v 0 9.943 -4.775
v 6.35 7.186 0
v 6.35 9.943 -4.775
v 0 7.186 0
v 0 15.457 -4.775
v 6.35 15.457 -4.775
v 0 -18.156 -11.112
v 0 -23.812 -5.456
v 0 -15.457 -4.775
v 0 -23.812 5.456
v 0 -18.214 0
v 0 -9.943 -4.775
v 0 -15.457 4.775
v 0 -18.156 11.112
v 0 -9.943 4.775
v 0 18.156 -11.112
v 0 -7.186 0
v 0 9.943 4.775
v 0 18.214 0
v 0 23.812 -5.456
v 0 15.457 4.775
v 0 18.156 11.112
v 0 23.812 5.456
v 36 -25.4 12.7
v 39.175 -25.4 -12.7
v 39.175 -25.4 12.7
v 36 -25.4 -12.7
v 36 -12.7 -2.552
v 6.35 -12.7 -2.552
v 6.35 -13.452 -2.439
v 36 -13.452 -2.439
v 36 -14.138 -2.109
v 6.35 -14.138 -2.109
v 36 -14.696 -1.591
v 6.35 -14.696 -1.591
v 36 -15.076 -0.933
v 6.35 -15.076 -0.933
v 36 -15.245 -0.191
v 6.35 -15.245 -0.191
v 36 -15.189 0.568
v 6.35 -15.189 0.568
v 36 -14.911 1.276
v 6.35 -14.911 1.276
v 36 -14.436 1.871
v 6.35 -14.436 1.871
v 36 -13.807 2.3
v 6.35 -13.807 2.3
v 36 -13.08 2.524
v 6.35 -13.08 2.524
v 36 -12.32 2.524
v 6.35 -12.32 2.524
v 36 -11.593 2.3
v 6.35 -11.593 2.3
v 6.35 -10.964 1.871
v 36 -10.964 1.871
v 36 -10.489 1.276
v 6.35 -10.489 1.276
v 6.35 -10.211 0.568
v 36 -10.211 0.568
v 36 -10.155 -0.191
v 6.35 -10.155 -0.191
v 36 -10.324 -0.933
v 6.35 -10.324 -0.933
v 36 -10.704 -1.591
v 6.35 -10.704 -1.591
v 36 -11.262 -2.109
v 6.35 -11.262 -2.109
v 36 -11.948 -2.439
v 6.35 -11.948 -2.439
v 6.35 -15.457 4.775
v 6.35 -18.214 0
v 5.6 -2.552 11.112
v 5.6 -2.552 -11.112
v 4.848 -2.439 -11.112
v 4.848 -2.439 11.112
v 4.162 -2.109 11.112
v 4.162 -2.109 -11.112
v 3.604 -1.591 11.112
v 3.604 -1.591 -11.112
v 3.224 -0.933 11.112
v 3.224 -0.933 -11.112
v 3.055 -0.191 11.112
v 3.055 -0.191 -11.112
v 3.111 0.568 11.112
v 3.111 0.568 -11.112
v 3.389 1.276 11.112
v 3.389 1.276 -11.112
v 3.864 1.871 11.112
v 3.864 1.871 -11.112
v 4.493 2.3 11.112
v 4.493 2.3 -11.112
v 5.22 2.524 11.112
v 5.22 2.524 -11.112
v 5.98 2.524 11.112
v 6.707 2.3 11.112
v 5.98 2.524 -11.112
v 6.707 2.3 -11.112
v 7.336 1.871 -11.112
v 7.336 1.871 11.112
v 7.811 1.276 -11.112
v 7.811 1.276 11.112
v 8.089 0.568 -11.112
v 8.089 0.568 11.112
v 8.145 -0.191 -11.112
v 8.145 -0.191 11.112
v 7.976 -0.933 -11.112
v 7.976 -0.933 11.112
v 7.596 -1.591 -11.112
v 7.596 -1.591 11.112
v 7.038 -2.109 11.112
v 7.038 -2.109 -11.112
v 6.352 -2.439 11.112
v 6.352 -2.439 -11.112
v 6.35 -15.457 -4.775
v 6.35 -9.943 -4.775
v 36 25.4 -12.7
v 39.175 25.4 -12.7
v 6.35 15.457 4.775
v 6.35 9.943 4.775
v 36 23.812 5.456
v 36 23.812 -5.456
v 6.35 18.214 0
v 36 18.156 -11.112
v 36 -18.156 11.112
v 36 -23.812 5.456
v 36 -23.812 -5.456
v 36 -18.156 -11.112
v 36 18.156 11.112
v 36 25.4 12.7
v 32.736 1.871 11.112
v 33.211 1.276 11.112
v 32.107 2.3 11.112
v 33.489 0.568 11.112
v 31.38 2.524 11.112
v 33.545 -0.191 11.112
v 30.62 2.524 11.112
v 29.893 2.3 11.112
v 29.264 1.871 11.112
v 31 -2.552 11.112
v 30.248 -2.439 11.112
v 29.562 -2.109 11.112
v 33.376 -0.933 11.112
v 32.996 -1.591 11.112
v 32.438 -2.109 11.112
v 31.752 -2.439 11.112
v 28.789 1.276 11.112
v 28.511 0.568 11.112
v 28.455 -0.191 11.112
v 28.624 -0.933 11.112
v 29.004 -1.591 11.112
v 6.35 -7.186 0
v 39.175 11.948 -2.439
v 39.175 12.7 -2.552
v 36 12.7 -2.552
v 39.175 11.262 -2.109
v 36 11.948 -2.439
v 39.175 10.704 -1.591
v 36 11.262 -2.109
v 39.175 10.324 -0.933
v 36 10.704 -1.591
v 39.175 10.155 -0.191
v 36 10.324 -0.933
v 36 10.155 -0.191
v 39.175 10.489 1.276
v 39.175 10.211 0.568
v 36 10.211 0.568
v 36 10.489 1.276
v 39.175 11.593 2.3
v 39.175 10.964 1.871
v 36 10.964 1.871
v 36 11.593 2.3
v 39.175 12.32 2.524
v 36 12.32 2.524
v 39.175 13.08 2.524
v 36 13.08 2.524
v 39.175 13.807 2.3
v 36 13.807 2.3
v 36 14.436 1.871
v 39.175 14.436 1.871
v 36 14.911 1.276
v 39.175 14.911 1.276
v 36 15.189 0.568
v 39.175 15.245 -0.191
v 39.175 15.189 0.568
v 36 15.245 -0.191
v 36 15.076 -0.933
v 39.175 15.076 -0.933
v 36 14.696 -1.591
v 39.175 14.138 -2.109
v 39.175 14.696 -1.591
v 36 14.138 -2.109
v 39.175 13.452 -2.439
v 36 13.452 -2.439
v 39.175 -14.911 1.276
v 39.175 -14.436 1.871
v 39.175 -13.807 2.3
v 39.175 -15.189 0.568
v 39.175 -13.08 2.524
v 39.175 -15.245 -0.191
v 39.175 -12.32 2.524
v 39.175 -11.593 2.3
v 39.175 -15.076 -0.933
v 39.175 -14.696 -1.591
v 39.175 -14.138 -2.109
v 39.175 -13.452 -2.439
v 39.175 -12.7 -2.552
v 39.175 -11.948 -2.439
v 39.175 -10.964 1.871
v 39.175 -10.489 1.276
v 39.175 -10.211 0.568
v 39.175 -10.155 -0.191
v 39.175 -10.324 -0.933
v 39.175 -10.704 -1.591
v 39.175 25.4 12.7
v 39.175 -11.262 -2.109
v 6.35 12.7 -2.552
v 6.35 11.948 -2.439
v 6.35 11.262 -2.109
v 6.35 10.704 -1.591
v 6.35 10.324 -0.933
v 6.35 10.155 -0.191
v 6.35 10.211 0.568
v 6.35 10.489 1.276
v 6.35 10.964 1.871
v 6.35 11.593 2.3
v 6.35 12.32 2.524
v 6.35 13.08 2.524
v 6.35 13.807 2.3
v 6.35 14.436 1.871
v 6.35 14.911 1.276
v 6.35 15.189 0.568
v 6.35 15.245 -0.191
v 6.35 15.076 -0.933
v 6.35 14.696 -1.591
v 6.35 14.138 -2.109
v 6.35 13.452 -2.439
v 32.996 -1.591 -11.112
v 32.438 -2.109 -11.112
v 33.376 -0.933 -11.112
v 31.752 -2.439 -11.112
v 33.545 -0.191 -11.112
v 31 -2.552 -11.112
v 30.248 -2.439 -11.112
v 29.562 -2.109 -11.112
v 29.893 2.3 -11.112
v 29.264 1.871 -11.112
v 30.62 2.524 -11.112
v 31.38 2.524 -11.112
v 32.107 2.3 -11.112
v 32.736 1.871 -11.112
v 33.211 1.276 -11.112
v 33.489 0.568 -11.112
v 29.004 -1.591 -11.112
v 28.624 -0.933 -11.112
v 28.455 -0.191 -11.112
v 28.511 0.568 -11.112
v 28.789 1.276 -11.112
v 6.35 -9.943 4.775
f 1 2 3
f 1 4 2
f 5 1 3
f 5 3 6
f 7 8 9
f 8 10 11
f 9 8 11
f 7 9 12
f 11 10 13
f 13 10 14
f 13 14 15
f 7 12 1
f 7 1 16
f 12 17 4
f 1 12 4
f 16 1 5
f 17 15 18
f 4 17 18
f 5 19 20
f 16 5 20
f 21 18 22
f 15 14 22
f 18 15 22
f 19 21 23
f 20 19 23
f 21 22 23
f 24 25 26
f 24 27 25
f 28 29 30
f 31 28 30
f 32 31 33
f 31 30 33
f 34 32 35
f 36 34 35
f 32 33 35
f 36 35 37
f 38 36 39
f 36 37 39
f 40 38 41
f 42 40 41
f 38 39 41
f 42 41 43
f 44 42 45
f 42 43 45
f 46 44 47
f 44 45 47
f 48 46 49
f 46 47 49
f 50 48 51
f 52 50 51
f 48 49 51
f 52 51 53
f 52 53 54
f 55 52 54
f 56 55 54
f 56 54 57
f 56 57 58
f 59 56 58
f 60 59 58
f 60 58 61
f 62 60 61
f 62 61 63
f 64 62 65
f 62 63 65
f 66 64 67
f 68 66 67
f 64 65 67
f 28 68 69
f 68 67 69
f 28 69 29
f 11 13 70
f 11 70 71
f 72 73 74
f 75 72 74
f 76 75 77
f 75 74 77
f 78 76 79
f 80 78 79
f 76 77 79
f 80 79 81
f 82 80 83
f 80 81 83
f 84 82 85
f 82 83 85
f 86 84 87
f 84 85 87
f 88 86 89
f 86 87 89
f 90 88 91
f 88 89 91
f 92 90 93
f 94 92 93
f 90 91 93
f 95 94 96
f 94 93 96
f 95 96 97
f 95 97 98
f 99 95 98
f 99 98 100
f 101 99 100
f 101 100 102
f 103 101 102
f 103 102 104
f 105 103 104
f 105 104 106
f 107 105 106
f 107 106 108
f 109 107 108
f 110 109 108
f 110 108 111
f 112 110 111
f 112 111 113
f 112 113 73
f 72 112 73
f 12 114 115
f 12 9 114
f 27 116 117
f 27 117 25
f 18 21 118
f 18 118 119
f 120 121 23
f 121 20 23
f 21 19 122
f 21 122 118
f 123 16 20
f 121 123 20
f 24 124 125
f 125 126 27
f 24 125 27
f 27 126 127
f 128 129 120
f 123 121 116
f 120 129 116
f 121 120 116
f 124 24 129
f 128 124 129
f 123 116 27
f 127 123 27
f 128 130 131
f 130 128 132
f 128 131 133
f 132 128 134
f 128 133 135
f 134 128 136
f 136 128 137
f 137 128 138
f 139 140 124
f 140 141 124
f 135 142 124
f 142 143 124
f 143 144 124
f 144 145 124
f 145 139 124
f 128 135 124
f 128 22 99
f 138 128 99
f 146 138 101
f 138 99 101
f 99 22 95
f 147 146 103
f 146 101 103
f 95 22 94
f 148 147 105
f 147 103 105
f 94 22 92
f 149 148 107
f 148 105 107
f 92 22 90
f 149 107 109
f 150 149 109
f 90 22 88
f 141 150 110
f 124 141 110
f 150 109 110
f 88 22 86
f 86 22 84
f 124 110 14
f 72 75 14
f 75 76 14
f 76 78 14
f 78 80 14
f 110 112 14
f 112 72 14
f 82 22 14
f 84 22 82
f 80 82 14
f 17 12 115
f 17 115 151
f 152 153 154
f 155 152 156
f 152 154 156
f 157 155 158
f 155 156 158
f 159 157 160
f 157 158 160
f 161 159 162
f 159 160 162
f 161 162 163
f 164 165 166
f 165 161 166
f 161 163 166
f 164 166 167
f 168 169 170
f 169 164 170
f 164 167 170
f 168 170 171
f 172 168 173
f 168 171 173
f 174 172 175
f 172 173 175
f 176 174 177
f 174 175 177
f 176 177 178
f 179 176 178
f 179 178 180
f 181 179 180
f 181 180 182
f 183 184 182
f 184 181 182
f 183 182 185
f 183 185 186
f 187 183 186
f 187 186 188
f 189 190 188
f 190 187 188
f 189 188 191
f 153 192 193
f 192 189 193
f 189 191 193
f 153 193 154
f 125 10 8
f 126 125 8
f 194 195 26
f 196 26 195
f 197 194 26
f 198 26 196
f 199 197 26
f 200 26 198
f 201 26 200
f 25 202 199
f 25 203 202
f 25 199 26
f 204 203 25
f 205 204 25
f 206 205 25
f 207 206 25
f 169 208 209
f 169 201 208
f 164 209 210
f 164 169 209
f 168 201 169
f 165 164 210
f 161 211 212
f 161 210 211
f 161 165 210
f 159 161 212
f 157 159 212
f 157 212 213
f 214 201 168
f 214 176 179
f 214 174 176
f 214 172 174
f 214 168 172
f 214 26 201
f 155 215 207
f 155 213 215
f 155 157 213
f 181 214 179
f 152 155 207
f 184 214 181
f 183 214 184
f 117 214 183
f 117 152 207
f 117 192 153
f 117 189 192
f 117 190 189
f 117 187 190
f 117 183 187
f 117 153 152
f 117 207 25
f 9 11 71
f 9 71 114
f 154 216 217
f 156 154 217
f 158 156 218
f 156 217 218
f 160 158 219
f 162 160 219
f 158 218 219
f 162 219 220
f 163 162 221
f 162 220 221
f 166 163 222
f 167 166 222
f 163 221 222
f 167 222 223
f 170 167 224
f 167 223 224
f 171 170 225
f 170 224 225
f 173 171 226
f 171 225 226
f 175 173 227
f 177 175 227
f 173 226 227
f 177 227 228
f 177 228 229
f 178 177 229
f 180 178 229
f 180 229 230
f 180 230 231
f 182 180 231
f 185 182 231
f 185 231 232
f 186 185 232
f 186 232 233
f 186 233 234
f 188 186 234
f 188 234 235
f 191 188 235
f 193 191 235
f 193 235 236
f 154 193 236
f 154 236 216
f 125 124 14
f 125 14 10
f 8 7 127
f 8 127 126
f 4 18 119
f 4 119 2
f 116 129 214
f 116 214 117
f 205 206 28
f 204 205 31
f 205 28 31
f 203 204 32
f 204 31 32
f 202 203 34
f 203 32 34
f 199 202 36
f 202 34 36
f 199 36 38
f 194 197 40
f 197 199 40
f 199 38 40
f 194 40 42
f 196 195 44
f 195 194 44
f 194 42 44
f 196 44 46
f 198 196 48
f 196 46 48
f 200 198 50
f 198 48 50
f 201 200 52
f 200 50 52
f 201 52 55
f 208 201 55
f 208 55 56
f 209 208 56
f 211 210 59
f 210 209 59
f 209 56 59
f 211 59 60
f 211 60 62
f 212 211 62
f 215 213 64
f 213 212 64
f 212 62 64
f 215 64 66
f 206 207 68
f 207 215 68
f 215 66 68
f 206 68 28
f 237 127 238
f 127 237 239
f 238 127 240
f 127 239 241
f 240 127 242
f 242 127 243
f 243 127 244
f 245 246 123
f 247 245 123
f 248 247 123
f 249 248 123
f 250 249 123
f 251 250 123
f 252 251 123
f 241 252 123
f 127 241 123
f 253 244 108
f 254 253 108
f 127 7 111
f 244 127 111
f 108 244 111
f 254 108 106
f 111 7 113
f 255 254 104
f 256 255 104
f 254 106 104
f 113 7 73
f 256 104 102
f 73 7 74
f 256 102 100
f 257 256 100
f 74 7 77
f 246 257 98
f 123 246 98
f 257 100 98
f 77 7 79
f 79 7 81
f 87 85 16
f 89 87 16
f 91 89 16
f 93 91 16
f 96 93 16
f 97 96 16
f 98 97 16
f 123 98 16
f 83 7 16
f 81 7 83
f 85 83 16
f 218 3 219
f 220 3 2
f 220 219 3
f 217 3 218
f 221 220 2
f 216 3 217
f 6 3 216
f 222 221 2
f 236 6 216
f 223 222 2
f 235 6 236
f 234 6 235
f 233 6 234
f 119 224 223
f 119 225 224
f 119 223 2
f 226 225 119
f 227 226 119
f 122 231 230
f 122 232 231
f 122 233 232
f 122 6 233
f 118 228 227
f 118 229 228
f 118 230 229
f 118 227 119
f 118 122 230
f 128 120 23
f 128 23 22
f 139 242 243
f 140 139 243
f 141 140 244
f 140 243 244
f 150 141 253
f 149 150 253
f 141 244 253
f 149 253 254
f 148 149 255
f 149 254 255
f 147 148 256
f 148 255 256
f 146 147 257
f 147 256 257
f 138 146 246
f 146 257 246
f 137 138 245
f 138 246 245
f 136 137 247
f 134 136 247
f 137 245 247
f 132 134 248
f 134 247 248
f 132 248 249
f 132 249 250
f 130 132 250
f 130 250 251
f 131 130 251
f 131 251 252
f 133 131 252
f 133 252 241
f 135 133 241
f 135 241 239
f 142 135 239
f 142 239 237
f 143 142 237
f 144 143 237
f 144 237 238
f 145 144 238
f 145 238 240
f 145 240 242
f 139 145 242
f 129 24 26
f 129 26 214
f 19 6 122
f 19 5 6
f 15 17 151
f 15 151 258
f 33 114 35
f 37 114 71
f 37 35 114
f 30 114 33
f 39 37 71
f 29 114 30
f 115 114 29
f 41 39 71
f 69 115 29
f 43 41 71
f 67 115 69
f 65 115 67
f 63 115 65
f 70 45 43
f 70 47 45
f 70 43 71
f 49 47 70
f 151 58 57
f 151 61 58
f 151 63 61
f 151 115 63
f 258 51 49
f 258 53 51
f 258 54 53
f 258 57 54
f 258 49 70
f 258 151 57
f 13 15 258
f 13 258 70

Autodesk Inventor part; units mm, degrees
ref_plane "YZ Plane" through (0, 0, 0) normal (1, 0, 0) x (0, 1, 0)
ref_plane "XZ Plane" through (0, 0, 0) normal (0, 1, 0) x (-1, 0, 0)
ref_plane "XY Plane" through (0, 0, 0) normal (0, 0, 1) x (1, 0, 0)
sketch "Sketch1" plane through (0, 0, 0) normal (1, 0, 0) x (0, 1, 0)
  line L0 (-23.8125, -11.1125) -> (23.8125, -11.1125)
  line L1 (23.8125, -11.1125) -> (23.8125, 11.1125)
  line L2 (23.8125, 11.1125) -> (-23.8125, 11.1125)
  line L3 (-23.8125, 11.1125) -> (-23.8125, -11.1125)
  line L4 (-23.8125, -11.1125) -> (23.8125, 11.1125) construction
  line L5 (23.8125, -11.1125) -> (-23.8125, 11.1125) construction
  line L6 (23.8125, 5.4556) -> (18.1556, 11.1125)
  line L7 (-18.1556, 11.1125) -> (-23.8125, 5.4556)
  line L8 (-18.1556, -11.1125) -> (-23.8125, -5.4556)
  line L9 (18.1556, -11.1125) -> (23.8125, -5.4556)
  point P0 (0, 0)
  dimension "d0" = 135
  dimension "d1" = 135
  dimension "d2" = 4
  dimension "d3" = 47.625
  dimension "d4" = 22.225
extrude "Extrusion1" add sketch "Sketch1" along normal blind 36 contours L8 L3 L7 L2 L6 L1 L9 L0
sketch "Sketch2" plane through (36, 0, 0) normal (1, 0, 0) x (0, 0, -1)
  line L0 (0, 12.7) -> (0, -12.7)
  point P0 (0, 0)
  point P1 (0, 0)
  dimension "d7" = 25.4
hole "Hole1" at (36, 12.7, 0) at (36, -12.7, 0) direction (-1, 0, 0) diameter 5.105 end through all clearance for "Flat Head Machine Screw (82)" size "#10" standard "Ansi Unified Screw Threads"
sketch "Sketch3" plane through (0, 0, 0) normal (-1, 0, 0) x (0, 0, 1)
  circle A0 centre (0, 12.7) radius 2.5525 projected
  line L0 (-4.7752, 15.457) -> (0, 18.2139)
  line L1 (0, 18.2139) -> (4.7752, 15.457)
  line L2 (4.7752, 15.457) -> (4.7752, 9.943)
  line L3 (4.7752, 9.943) -> (0, 7.1861)
  line L4 (0, 7.1861) -> (-4.7752, 9.943)
  line L5 (-4.7752, 9.943) -> (-4.7752, 15.457)
  circle A1 centre (0, -12.7) radius 2.5525 projected
  line L6 (-4.7752, -9.943) -> (0, -7.1861)
  line L7 (0, -7.1861) -> (4.7752, -9.943)
  line L8 (4.7752, -9.943) -> (4.7752, -15.457)
  line L9 (4.7752, -15.457) -> (0, -18.2139)
  line L10 (0, -18.2139) -> (-4.7752, -15.457)
  line L11 (-4.7752, -15.457) -> (-4.7752, -9.943)
  point P0 (0, 0)
  dimension "d15" = 9.5504
  dimension "d16" = 9.5504
extrude "Extrusion2" cut sketch "Sketch3" against normal blind 6.35 contours A0 | L0 L1 L2 L3 L4 L5 | A1 | L6 L7 L8 L9 L10 L11
sketch "Sketch4" plane through (36, 0, 0) normal (1, 0, 0) x (0, 0, -1)
  line L0 (12.7, -25.4) -> (-12.7, -25.4)
  line L1 (-12.7, -25.4) -> (-12.7, 25.4)
  line L2 (-12.7, 25.4) -> (12.7, 25.4)
  line L3 (12.7, 25.4) -> (12.7, -25.4)
  line L4 (12.7, -25.4) -> (-12.7, 25.4) construction
  line L5 (-12.7, -25.4) -> (12.7, 25.4) construction
  circle A0 centre (0, 12.7) radius 2.5525 projected
  circle A1 centre (0, -12.7) radius 2.5525 projected
  point P0 (0, 0)
  dimension "d19" = 25.4
  dimension "d20" = 50.8
extrude "Extrusion3" add sketch "Sketch4" along normal blind 3.175
sketch "Sketch5" plane through (0, -18.1556, 11.1125) normal (0, 0, 1) x (1, 0, 0)
  line L0 (36, 43.5556) -> (36, -7.2444) projected
  line L1 (0, 36.3113) -> (0, 0) projected
  point P0 (0, 18.1556)
  point P1 (31, 18.1556)
  point P2 (5.6, 18.1556)
  point P3 (0, 18.1556)
  dimension "d23" = 25.4
  dimension "d24" = 5
hole "Hole2" at (31, 0, 11.1125) at (5.6, 0, 11.1125) direction (0, 0, -1) diameter 5.105 end through all clearance for "Flat Head Machine Screw (82)" size "#10" standard "Ansi Unified Screw Threads"
equation "\"d1\" = d0"
equation "\"d16\" = d15"
properties part number "TUBE_PLUGS" material "3D Print Material - chopped carbon Nylon12 (preferred)"
